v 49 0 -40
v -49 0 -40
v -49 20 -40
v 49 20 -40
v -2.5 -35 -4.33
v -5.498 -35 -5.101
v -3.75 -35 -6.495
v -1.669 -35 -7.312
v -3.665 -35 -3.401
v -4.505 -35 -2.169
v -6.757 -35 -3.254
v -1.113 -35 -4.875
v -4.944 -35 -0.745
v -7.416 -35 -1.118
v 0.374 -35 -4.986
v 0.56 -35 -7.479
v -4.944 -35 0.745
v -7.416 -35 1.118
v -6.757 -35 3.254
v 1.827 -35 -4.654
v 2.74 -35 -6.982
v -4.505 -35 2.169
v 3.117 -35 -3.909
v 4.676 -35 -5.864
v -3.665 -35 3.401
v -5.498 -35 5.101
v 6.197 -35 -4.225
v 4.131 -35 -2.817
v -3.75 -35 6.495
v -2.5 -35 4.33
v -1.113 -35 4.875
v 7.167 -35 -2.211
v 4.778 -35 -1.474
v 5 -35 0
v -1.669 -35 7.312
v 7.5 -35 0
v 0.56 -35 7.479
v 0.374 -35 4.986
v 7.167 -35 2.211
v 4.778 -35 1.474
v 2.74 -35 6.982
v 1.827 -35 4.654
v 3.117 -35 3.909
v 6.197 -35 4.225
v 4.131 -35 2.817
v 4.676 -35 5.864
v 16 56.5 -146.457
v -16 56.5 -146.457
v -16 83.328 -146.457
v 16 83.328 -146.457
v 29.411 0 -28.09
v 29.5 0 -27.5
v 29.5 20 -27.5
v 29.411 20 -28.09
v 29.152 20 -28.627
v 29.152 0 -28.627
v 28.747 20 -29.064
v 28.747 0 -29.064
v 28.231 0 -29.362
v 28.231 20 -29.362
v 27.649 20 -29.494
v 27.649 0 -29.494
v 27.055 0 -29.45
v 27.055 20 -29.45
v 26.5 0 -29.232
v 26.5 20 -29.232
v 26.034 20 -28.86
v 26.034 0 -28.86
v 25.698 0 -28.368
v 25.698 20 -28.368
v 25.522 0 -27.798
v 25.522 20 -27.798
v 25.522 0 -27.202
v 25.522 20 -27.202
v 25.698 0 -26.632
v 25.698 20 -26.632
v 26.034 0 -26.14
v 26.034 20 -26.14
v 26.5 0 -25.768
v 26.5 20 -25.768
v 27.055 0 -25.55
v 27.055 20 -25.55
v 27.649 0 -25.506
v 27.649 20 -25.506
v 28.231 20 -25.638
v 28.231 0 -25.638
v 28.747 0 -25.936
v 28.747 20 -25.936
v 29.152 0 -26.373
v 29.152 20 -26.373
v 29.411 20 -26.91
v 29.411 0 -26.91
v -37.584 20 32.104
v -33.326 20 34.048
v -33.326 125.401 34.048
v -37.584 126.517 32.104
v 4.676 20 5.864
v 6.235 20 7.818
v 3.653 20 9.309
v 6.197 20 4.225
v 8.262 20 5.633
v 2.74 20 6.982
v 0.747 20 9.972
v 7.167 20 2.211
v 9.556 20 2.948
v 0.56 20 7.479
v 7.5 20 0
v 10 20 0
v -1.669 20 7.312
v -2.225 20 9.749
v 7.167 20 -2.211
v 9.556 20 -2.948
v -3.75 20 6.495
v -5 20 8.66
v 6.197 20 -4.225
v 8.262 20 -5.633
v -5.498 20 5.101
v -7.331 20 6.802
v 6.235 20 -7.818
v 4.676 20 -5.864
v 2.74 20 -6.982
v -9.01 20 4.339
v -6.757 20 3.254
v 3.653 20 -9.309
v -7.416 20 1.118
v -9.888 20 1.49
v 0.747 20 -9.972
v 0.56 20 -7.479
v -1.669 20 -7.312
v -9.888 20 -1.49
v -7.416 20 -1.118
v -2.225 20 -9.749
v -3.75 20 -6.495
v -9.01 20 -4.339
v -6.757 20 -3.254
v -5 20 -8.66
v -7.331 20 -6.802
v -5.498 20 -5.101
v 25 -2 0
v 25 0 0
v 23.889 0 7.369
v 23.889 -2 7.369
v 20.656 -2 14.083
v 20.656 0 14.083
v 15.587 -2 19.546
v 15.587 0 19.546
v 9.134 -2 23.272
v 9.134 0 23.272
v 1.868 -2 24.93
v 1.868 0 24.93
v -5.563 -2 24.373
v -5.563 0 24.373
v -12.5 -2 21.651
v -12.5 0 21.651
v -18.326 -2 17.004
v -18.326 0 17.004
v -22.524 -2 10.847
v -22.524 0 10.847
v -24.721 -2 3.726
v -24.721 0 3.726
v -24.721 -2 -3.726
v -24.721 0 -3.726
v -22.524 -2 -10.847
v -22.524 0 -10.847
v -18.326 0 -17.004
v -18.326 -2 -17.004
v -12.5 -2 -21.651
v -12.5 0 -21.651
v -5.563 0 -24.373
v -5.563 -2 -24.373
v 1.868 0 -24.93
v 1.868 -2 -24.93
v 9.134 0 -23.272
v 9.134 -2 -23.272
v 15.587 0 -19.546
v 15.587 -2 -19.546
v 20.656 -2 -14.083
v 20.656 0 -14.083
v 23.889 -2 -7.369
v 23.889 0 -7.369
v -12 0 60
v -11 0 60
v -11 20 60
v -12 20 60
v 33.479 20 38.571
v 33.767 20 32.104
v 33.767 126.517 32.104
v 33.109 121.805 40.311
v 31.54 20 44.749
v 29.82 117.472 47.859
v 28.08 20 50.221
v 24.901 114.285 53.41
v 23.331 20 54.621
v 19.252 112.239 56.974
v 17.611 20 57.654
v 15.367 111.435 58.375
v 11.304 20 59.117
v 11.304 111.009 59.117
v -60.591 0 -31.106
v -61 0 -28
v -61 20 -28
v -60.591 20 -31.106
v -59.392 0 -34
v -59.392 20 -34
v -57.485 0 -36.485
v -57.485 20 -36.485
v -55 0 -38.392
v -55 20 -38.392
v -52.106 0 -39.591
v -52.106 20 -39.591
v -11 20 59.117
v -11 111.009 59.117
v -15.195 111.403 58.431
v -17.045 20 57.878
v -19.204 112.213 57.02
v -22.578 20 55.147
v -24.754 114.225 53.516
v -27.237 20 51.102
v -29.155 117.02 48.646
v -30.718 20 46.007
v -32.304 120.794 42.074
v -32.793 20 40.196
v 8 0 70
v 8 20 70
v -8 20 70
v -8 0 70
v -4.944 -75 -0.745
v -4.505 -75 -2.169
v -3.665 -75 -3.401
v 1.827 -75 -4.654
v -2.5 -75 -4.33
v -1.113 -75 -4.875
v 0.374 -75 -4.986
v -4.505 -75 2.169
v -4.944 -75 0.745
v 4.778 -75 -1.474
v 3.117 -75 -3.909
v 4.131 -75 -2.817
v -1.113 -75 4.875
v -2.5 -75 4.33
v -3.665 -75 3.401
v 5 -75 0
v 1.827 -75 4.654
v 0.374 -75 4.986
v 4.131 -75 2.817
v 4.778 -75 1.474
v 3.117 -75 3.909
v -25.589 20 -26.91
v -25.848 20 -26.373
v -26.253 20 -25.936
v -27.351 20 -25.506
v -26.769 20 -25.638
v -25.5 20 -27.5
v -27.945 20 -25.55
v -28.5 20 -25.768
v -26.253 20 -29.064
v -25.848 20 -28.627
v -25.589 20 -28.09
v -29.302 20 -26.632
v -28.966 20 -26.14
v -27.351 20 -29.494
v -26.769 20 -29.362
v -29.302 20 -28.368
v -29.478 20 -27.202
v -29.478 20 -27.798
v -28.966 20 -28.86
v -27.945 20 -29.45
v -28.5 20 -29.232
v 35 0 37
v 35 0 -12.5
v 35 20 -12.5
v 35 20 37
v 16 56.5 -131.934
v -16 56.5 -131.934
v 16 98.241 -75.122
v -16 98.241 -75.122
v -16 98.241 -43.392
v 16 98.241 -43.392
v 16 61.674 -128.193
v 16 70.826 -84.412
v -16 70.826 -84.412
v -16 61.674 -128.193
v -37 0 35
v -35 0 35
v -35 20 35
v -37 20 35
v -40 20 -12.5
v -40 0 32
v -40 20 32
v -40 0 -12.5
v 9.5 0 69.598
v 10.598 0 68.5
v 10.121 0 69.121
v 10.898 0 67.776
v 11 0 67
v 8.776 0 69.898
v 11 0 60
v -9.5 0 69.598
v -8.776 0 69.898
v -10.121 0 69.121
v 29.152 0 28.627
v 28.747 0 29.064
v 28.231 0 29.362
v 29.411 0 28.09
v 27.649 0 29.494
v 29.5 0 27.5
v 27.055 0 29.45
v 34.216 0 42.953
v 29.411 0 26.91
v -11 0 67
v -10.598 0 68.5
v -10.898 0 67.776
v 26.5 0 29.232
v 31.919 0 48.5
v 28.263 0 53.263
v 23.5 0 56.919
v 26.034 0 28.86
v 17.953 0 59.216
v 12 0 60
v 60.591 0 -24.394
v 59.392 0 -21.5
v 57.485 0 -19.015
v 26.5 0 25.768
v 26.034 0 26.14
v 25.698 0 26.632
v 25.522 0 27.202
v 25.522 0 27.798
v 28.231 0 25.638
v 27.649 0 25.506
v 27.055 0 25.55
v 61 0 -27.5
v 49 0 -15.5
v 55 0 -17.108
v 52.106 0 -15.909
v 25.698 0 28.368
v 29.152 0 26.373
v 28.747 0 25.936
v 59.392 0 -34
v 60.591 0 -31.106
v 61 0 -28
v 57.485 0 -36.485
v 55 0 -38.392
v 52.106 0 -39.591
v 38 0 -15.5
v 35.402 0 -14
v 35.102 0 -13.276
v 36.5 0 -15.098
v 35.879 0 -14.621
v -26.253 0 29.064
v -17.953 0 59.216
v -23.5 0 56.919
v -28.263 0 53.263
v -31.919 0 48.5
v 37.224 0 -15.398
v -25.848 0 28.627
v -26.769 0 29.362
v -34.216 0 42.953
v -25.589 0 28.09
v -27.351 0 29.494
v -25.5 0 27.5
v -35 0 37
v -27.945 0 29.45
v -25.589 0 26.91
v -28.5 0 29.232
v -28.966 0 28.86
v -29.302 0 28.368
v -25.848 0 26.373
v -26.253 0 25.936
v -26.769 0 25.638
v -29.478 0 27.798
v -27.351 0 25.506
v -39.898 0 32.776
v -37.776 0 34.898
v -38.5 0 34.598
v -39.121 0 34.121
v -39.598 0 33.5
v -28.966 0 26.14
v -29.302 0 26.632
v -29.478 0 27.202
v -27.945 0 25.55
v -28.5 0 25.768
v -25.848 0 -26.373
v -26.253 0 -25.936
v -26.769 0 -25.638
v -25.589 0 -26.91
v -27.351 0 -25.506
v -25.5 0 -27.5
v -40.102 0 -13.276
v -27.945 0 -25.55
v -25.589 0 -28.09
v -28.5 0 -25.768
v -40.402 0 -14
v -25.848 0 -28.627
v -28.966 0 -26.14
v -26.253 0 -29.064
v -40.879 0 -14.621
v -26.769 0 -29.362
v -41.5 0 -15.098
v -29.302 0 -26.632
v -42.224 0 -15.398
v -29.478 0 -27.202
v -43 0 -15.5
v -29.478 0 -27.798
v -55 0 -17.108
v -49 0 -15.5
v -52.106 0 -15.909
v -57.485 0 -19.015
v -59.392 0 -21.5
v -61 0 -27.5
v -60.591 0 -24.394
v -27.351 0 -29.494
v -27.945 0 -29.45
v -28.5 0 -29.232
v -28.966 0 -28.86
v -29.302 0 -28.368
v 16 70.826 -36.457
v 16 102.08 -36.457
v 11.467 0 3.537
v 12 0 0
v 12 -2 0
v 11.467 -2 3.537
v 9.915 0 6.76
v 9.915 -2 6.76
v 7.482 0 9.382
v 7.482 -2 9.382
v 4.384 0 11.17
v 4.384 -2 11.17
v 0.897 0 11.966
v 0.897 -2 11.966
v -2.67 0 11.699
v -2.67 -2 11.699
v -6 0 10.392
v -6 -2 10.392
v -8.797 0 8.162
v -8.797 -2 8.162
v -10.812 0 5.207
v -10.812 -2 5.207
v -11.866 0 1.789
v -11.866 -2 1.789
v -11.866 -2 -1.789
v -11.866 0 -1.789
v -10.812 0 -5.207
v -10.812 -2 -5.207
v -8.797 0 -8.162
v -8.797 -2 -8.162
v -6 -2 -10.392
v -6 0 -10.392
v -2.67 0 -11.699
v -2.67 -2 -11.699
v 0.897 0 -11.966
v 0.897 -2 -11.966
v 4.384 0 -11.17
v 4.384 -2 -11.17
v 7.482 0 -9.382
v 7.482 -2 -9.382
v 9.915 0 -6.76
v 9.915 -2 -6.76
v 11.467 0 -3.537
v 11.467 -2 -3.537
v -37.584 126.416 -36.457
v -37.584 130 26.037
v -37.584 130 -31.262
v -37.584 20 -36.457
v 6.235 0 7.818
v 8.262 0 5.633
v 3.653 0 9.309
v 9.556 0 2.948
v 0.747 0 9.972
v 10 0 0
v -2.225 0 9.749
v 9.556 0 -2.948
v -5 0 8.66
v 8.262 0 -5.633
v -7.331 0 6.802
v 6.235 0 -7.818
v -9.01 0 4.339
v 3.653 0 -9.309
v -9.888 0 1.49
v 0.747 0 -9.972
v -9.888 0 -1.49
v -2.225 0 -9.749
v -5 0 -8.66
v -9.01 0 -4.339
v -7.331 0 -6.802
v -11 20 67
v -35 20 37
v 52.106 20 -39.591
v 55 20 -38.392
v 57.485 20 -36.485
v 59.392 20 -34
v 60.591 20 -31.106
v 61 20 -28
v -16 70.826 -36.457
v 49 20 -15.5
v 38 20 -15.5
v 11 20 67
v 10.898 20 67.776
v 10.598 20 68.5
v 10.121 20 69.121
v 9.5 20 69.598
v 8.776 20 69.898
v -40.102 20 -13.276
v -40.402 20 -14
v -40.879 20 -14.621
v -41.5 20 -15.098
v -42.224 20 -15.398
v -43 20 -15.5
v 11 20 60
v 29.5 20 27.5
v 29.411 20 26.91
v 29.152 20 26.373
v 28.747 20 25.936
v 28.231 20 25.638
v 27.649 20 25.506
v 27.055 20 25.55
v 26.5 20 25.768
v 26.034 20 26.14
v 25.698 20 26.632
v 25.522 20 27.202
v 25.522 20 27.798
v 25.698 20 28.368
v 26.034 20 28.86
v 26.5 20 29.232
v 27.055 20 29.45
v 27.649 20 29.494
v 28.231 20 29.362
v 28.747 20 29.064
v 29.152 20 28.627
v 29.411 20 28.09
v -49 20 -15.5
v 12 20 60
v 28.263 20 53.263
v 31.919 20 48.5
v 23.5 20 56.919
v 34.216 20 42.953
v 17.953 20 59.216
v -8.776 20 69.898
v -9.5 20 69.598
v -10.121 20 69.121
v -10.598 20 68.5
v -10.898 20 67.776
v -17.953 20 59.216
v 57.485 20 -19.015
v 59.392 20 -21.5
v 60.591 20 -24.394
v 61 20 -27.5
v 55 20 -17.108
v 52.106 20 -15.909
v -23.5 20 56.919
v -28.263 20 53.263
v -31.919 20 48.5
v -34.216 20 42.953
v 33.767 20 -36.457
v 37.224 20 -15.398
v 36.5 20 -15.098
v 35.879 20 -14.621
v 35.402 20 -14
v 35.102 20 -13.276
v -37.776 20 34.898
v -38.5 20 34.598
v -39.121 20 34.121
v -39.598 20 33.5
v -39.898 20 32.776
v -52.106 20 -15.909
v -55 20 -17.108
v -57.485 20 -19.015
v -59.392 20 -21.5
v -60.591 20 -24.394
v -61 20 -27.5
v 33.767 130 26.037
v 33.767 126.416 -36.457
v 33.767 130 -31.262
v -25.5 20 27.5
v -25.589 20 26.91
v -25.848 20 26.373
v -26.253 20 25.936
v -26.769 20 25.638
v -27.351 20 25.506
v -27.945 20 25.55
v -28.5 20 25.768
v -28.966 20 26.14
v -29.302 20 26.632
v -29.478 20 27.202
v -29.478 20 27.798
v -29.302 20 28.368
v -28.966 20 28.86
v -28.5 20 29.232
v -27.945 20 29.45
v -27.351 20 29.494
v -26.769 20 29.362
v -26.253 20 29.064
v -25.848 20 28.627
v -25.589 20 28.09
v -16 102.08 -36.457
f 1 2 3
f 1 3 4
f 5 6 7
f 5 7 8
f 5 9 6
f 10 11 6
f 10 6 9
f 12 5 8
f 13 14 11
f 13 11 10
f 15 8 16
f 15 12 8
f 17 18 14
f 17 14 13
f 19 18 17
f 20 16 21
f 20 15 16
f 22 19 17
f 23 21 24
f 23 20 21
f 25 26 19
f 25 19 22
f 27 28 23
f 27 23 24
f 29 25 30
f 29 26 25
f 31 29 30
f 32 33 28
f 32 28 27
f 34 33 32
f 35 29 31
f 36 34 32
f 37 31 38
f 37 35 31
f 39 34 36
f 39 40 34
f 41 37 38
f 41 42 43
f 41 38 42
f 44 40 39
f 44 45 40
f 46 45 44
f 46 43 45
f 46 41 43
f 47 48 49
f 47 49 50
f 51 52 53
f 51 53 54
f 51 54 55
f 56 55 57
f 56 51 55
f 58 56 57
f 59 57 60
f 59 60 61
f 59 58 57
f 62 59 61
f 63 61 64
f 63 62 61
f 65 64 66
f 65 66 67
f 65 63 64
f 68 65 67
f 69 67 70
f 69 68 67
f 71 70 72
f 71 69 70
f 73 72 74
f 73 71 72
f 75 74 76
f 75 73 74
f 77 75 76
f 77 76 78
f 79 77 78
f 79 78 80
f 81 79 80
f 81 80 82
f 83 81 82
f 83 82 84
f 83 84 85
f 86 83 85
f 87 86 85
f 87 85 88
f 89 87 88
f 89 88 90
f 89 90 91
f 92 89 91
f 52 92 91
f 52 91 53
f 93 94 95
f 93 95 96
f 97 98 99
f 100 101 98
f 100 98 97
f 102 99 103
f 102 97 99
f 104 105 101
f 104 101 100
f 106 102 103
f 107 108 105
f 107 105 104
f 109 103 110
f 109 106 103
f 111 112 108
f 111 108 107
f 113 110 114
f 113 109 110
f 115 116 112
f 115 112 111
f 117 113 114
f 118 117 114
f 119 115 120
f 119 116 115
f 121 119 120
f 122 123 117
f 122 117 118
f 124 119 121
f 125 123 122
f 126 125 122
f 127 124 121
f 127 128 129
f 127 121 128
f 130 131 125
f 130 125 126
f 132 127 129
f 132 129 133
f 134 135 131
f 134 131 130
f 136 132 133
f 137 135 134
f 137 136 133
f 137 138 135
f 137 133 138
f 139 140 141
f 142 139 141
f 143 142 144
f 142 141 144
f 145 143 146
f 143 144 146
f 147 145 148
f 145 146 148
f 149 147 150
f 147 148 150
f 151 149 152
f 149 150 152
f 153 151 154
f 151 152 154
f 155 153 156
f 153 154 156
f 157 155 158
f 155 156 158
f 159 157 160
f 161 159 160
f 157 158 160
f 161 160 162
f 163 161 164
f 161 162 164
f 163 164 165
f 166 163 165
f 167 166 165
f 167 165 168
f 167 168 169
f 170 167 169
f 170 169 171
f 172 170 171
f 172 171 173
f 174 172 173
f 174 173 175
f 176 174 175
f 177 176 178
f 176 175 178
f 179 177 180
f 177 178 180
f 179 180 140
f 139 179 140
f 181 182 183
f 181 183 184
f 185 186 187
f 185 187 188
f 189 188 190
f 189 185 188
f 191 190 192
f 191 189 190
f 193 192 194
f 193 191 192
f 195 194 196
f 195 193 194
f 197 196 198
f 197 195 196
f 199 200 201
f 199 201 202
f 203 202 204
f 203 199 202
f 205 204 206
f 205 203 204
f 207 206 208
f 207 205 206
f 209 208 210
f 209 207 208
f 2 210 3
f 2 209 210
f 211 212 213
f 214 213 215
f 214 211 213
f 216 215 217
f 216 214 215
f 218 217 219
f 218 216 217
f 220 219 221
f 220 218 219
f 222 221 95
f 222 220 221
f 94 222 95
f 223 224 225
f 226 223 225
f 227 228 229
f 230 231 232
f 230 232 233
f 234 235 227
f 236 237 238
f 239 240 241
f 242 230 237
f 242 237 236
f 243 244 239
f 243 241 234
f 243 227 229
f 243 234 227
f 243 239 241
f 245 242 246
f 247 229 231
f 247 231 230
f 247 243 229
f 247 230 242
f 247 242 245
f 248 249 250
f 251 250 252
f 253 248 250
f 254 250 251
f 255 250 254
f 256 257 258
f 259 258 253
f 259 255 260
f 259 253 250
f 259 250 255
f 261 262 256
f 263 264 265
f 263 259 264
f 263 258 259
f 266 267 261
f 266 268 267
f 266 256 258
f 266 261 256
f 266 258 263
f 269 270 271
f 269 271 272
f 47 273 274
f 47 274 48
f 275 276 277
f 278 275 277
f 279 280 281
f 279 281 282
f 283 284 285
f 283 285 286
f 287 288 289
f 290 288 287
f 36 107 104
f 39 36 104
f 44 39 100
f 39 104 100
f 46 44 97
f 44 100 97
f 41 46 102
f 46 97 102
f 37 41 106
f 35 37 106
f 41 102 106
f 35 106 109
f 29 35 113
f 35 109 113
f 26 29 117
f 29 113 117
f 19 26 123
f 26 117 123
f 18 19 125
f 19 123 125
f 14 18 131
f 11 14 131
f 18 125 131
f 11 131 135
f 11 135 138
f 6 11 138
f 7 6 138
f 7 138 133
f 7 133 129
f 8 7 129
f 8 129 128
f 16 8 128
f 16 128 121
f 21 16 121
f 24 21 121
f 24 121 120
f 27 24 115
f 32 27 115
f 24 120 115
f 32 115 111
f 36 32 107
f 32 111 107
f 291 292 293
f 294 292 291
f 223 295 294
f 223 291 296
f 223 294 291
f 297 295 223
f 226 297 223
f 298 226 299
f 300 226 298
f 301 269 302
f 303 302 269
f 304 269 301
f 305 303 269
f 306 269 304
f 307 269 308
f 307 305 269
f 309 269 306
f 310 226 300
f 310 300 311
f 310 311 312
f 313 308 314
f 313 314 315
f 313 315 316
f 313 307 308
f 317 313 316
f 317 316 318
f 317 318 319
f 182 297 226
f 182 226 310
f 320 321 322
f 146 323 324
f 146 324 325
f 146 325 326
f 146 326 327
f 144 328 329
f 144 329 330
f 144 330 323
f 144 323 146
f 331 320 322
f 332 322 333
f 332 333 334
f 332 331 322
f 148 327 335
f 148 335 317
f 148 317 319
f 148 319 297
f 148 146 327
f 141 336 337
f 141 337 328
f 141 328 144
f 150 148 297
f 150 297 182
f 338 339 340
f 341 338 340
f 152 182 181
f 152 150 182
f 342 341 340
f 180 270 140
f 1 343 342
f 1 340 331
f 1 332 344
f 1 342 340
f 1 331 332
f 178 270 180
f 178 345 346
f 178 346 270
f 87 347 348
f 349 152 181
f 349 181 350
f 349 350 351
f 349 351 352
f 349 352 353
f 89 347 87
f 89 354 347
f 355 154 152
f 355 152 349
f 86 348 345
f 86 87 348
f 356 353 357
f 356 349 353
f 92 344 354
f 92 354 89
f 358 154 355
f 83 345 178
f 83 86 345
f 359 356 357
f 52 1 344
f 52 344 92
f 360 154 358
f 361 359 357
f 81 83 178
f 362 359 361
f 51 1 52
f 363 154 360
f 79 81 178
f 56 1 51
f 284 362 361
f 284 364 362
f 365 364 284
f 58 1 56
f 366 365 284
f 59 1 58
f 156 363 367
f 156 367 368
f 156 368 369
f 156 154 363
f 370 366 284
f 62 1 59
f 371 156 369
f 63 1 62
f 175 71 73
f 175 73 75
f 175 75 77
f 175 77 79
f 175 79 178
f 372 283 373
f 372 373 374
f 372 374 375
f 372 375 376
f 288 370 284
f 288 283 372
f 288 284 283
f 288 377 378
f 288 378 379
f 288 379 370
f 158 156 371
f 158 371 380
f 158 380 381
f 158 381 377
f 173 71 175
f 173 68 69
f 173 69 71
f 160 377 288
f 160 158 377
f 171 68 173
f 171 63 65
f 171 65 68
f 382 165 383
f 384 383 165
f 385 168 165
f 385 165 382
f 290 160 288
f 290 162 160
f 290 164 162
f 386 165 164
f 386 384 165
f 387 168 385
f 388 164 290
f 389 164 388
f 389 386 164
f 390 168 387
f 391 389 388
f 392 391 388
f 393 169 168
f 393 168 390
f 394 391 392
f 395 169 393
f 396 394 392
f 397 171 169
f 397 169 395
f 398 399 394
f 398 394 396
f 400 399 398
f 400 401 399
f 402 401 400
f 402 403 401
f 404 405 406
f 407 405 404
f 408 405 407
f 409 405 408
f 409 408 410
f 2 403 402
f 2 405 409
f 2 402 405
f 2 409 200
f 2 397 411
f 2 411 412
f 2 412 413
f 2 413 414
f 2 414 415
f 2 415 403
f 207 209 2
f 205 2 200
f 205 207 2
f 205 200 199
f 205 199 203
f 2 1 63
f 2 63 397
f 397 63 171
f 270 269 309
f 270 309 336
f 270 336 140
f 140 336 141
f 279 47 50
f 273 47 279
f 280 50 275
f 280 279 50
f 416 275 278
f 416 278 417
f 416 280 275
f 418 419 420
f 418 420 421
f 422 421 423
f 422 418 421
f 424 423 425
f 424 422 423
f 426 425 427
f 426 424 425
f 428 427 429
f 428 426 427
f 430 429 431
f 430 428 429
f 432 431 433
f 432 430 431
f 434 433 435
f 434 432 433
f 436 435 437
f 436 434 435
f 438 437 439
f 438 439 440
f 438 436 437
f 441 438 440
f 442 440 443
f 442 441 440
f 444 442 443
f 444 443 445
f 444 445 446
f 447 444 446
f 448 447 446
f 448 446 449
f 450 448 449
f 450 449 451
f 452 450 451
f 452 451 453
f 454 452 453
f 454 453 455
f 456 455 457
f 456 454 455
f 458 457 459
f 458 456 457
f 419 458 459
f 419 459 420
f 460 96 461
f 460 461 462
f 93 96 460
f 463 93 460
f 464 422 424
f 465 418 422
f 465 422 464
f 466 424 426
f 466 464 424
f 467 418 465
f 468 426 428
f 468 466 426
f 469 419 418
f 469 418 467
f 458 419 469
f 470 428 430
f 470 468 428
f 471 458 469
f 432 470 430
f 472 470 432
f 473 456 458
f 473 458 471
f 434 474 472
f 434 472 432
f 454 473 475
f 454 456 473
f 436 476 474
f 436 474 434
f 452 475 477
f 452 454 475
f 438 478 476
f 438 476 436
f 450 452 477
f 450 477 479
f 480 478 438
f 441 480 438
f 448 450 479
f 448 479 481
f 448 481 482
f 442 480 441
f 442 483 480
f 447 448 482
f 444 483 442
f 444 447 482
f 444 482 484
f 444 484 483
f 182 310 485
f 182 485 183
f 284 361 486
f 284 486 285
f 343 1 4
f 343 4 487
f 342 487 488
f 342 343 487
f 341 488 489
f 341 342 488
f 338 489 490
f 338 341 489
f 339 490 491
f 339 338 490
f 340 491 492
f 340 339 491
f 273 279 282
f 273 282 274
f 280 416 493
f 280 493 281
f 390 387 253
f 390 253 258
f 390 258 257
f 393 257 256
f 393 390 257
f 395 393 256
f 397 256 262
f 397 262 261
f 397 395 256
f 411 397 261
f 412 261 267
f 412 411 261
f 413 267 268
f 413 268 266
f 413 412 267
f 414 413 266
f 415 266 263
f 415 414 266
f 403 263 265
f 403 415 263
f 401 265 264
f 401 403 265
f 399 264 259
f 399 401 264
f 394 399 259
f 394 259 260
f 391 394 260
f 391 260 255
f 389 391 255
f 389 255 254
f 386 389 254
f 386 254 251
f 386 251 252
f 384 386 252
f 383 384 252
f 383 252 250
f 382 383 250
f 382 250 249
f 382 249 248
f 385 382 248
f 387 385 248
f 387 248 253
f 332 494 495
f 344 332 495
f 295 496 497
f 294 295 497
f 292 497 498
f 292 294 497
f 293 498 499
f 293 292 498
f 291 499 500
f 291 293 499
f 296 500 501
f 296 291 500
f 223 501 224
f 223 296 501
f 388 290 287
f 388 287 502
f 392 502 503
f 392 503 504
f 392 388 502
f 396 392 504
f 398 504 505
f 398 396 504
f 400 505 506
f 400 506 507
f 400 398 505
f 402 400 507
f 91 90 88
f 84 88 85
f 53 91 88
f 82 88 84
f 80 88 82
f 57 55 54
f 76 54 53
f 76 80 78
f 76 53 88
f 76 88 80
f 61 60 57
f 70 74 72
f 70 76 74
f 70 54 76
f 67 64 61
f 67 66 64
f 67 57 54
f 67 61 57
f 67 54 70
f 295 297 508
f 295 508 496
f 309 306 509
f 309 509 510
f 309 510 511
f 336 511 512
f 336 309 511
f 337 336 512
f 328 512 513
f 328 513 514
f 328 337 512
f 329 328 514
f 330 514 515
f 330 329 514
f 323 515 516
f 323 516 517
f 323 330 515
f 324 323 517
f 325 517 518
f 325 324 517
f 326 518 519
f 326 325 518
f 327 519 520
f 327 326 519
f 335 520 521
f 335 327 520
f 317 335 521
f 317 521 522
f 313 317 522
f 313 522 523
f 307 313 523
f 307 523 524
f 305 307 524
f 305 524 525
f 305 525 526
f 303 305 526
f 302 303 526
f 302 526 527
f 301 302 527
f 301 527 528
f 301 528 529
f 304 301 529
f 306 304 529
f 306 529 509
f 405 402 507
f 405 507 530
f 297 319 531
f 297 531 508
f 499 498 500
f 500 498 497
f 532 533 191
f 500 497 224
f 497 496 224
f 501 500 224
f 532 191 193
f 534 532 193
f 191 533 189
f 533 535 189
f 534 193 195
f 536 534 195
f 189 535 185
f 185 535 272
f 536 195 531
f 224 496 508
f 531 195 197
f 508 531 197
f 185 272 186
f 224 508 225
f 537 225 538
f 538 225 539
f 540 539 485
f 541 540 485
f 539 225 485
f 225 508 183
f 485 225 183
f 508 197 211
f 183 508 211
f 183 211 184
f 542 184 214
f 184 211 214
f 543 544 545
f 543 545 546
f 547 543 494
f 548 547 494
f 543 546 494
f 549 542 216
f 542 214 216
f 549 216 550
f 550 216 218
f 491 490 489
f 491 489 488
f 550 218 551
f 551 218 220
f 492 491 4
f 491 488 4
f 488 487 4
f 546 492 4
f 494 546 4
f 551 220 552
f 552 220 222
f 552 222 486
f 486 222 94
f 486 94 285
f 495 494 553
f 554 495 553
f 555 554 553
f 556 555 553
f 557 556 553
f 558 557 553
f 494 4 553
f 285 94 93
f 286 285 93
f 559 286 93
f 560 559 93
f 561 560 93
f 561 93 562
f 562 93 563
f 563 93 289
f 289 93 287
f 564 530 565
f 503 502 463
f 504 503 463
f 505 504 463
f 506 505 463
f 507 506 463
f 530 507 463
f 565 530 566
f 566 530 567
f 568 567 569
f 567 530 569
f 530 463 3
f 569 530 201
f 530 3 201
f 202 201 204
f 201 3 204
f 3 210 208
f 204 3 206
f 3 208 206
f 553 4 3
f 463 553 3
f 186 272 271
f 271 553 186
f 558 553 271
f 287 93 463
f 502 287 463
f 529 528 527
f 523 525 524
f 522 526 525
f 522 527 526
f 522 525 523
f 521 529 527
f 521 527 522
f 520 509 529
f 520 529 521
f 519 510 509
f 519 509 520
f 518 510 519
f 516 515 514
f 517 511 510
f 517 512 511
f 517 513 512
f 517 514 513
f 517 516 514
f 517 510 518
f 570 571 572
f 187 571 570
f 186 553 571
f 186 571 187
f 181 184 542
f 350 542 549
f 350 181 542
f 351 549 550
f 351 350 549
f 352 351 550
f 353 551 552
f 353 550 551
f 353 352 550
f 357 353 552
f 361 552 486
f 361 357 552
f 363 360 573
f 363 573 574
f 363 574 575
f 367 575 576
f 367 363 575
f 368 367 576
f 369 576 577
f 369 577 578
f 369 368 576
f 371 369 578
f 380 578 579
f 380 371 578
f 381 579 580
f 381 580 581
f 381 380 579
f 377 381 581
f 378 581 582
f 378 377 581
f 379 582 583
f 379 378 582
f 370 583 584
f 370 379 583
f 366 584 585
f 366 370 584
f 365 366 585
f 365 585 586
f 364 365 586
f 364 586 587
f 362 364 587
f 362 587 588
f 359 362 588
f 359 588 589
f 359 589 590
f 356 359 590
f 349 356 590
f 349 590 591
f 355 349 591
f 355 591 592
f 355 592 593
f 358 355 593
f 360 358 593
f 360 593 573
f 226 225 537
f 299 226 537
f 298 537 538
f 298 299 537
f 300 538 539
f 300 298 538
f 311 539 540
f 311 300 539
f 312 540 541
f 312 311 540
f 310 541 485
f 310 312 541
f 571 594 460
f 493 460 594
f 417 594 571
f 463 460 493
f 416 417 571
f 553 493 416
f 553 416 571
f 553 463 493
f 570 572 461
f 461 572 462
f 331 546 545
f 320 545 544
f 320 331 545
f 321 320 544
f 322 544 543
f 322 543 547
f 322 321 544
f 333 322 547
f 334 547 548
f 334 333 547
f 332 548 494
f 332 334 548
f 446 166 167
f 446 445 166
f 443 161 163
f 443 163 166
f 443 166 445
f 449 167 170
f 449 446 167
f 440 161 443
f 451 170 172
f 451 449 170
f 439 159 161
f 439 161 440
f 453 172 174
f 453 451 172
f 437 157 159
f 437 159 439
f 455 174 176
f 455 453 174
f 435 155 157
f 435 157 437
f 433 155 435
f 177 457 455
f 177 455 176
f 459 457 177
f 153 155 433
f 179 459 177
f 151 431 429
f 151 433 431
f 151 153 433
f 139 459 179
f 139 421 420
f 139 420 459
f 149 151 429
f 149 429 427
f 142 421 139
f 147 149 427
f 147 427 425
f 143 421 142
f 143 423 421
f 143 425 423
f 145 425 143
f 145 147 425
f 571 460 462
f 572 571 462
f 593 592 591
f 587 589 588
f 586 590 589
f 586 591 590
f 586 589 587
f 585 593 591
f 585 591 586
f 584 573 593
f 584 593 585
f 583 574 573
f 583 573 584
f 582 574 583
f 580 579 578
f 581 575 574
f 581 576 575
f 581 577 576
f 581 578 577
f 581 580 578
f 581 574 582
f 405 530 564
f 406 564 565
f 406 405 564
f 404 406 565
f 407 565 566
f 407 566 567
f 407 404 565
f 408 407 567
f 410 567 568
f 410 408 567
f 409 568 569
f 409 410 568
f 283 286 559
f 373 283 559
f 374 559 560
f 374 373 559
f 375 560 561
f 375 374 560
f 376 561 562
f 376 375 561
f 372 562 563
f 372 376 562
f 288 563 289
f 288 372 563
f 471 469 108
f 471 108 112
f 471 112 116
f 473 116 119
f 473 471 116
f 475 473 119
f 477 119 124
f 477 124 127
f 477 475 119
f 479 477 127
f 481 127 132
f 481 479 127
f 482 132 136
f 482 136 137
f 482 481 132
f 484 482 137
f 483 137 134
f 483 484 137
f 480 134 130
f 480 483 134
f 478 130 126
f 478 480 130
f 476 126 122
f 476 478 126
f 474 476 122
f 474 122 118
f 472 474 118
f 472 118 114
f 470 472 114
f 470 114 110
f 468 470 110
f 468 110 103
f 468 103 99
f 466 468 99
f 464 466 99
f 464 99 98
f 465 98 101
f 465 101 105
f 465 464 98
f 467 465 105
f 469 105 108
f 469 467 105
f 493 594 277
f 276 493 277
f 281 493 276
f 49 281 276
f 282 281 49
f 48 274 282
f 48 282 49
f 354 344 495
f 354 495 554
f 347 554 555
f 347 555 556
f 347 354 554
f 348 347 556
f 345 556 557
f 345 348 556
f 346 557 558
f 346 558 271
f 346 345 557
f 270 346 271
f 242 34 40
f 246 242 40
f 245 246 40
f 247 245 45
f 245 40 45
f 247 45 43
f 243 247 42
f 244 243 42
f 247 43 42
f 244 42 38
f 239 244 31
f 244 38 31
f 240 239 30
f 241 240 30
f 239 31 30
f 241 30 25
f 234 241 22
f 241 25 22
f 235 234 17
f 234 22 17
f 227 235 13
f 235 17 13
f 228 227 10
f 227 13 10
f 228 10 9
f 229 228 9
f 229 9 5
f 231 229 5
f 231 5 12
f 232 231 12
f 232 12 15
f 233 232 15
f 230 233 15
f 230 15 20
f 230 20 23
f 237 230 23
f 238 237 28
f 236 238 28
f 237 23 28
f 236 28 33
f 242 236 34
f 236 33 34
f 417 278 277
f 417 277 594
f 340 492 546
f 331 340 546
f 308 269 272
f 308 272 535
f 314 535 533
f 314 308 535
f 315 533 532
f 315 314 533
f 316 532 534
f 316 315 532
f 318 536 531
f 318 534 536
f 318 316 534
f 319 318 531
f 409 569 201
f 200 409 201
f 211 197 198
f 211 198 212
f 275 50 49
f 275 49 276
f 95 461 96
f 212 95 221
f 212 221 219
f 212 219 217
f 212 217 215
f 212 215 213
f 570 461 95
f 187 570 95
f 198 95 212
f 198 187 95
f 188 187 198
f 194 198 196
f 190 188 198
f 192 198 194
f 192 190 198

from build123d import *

# Parameters (mm, degrees)
SKETCH_1_R               = 2
SKETCH_1_R_2             = 10
EXTRUDE_1_DEPTH          = 20
SKETCH_2_R               = 25
SKETCH_2_R_2             = 12
EXTRUDE_2_DEPTH          = 2
EXTRUDE_3_DEPTH          = 110
SKETCH_4_OUTSIDE_W       = 274.729
SKETCH_4_OUTSIDE_H       = 190.272
CUT_EXTRUDE_5_DEPTH      = 62
CUT_EXTRUDE_5_DEPTH_BACK = 62
SKETCH_5_R               = 7.5
EXTRUDE_4_DEPTH          = 55
SKETCH_6_R               = 5
EXTRUDE_5_DEPTH          = 40


with BuildPart() as part:
    # Эскиз1 → Бобышка-Вытянуть1 (new body)
    with BuildSketch(Plane(origin=(0, 0, 0), x_dir=(1, 0, 0), z_dir=(0, 1, 0))):
        with BuildLine():
            Line((35, 12.5), (35, -37))
            ThreePointArc((35, -37), (28.263455967, -53.263455967), (12, -60))
            Line((12, -60), (11, -60))
            Line((11, -60), (11, -67))
            ThreePointArc((11, -67), (10.121320344, -69.121320344), (8, -70))
            Line((8, -70), (-8, -70))
            ThreePointArc((-8, -70), (-10.121320344, -69.121320344), (-11, -67))
            Line((-11, -67), (-11, -60))
            Line((-11, -60), (-12, -60))
            ThreePointArc((-12, -60), (-28.263455967, -53.263455967), (-35, -37))
            Line((-35, -37), (-35, -35))
            Line((-35, -35), (-37, -35))
            ThreePointArc((-37, -35), (-39.121320344, -34.121320344), (-40, -32))
            Line((-40, -32), (-40, 12.5))
            ThreePointArc((-40, 12.5), (-40.878679656, 14.621320344), (-43, 15.5))
            Line((-43, 15.5), (-49, 15.5))
            ThreePointArc((-49, 15.5), (-57.485281374, 19.014718626), (-61, 27.5))
            Line((-61, 27.5), (-61, 28))
            ThreePointArc((-61, 28), (-57.485281374, 36.485281374), (-49, 40))
            Line((-49, 40), (49, 40))
            ThreePointArc((49, 40), (57.485281374, 36.485281374), (61, 28))
            Line((61, 28), (61, 27.5))
            ThreePointArc((61, 27.5), (57.485281374, 19.014718626), (49, 15.5))
            Line((49, 15.5), (38, 15.5))
            ThreePointArc((38, 15.5), (35.878679656, 14.621320344), (35, 12.5))
        make_face()
        with Locations((27.5, 27.5)):
            Circle(SKETCH_1_R, mode=Mode.SUBTRACT)
        with Locations((-27.5, 27.5)):
            Circle(SKETCH_1_R, mode=Mode.SUBTRACT)
        with Locations((-27.5, -27.5)):
            Circle(SKETCH_1_R, mode=Mode.SUBTRACT)
        with Locations((27.5, -27.5)):
            Circle(SKETCH_1_R, mode=Mode.SUBTRACT)
        Circle(SKETCH_1_R_2, mode=Mode.SUBTRACT)
    extrude(amount=EXTRUDE_1_DEPTH)

    # Эскиз2 → Бобышка-Вытянуть2 (add)
    with BuildSketch(Plane.XZ):
        Circle(SKETCH_2_R)
        Circle(SKETCH_2_R_2, mode=Mode.SUBTRACT)
    extrude(amount=EXTRUDE_2_DEPTH)

    # Эскиз3 → Бобышка-Вытянуть3 (add)
    with BuildSketch(Plane(origin=(0, 20, 0), x_dir=(1, 0, 0), z_dir=(0, 1, 0))):
        with BuildLine():
            Line((-37.583733624, -32.103535028), (-37.583733624, 36.457416544))
            Line((-37.583733624, 36.457416544), (-16, 36.457416544))
            Line((-16, 36.457416544), (-16, 146.457416544))
            Line((-16, 146.457416544), (16, 146.457416544))
            Line((16, 146.457416544), (16, 36.457416544))
            Line((16, 36.457416544), (33.766635678, 36.457416544))
            Line((33.766635678, 36.457416544), (33.766635678, -32.103535028))
            ThreePointArc((33.766635678, -32.103535028), (28.080470389, -50.220903637), (11.304482379, -59.11684357))
            Line((11.304482379, -59.11684357), (-11, -59.11684357))
            ThreePointArc((-11, -59.11684357), (-27.23731375, -51.101673534), (-33.326201299, -34.048264581))
            Line((-33.326201299, -34.048264581), (-37.583733624, -32.103535028))
        make_face()
    extrude(amount=EXTRUDE_3_DEPTH)

    # Эскиз4 outside → Вырез-Вытянуть5 (cut, two sides)
    with BuildSketch(Plane(origin=(0, 0, 0), x_dir=(0, 0, -1), z_dir=(1, 0, 0))) as cut_extrude_5_sk:
        with Locations((38.2285, 64)):
            Rectangle(SKETCH_4_OUTSIDE_W, SKETCH_4_OUTSIDE_H)
        Polygon((-59.11684357, 111.009140669), (-59.11684357, 20), (-70, 20), (-70, 0), (-25.61704501, 0), (-25.61704501, -2.465693048), (25.5, -2.465693048), (25.5, 0), (40, 0), (40, 20), (36.457416544, 20), (36.457416544, 70.826498743), (84.412407161, 70.826498743), (128.193178806, 61.67378586), (131.933723793, 56.499947934), (146.457416544, 56.499947934), (146.457416544, 83.32776512), (75.121913518, 98.241010205), (43.39244845, 98.241010205), (36.457416544, 102.079664685), (36.457416544, 126.416047598), (31.26241492, 130), (-26.036858243, 130), align=None, mode=Mode.SUBTRACT)
    extrude(amount=CUT_EXTRUDE_5_DEPTH, mode=Mode.SUBTRACT)
    extrude(cut_extrude_5_sk.sketch, amount=-CUT_EXTRUDE_5_DEPTH_BACK, mode=Mode.SUBTRACT)

    # Эскиз5 → Бобышка-Вытянуть4 (add)
    with BuildSketch(Plane.XZ.offset(-20)):
        Circle(SKETCH_5_R)
    extrude(amount=EXTRUDE_4_DEPTH)

    # Эскиз6 → Бобышка-Вытянуть5 (add)
    with BuildSketch(Plane.XZ.offset(35)):
        Circle(SKETCH_6_R)
    extrude(amount=EXTRUDE_5_DEPTH)


solid = part.part
